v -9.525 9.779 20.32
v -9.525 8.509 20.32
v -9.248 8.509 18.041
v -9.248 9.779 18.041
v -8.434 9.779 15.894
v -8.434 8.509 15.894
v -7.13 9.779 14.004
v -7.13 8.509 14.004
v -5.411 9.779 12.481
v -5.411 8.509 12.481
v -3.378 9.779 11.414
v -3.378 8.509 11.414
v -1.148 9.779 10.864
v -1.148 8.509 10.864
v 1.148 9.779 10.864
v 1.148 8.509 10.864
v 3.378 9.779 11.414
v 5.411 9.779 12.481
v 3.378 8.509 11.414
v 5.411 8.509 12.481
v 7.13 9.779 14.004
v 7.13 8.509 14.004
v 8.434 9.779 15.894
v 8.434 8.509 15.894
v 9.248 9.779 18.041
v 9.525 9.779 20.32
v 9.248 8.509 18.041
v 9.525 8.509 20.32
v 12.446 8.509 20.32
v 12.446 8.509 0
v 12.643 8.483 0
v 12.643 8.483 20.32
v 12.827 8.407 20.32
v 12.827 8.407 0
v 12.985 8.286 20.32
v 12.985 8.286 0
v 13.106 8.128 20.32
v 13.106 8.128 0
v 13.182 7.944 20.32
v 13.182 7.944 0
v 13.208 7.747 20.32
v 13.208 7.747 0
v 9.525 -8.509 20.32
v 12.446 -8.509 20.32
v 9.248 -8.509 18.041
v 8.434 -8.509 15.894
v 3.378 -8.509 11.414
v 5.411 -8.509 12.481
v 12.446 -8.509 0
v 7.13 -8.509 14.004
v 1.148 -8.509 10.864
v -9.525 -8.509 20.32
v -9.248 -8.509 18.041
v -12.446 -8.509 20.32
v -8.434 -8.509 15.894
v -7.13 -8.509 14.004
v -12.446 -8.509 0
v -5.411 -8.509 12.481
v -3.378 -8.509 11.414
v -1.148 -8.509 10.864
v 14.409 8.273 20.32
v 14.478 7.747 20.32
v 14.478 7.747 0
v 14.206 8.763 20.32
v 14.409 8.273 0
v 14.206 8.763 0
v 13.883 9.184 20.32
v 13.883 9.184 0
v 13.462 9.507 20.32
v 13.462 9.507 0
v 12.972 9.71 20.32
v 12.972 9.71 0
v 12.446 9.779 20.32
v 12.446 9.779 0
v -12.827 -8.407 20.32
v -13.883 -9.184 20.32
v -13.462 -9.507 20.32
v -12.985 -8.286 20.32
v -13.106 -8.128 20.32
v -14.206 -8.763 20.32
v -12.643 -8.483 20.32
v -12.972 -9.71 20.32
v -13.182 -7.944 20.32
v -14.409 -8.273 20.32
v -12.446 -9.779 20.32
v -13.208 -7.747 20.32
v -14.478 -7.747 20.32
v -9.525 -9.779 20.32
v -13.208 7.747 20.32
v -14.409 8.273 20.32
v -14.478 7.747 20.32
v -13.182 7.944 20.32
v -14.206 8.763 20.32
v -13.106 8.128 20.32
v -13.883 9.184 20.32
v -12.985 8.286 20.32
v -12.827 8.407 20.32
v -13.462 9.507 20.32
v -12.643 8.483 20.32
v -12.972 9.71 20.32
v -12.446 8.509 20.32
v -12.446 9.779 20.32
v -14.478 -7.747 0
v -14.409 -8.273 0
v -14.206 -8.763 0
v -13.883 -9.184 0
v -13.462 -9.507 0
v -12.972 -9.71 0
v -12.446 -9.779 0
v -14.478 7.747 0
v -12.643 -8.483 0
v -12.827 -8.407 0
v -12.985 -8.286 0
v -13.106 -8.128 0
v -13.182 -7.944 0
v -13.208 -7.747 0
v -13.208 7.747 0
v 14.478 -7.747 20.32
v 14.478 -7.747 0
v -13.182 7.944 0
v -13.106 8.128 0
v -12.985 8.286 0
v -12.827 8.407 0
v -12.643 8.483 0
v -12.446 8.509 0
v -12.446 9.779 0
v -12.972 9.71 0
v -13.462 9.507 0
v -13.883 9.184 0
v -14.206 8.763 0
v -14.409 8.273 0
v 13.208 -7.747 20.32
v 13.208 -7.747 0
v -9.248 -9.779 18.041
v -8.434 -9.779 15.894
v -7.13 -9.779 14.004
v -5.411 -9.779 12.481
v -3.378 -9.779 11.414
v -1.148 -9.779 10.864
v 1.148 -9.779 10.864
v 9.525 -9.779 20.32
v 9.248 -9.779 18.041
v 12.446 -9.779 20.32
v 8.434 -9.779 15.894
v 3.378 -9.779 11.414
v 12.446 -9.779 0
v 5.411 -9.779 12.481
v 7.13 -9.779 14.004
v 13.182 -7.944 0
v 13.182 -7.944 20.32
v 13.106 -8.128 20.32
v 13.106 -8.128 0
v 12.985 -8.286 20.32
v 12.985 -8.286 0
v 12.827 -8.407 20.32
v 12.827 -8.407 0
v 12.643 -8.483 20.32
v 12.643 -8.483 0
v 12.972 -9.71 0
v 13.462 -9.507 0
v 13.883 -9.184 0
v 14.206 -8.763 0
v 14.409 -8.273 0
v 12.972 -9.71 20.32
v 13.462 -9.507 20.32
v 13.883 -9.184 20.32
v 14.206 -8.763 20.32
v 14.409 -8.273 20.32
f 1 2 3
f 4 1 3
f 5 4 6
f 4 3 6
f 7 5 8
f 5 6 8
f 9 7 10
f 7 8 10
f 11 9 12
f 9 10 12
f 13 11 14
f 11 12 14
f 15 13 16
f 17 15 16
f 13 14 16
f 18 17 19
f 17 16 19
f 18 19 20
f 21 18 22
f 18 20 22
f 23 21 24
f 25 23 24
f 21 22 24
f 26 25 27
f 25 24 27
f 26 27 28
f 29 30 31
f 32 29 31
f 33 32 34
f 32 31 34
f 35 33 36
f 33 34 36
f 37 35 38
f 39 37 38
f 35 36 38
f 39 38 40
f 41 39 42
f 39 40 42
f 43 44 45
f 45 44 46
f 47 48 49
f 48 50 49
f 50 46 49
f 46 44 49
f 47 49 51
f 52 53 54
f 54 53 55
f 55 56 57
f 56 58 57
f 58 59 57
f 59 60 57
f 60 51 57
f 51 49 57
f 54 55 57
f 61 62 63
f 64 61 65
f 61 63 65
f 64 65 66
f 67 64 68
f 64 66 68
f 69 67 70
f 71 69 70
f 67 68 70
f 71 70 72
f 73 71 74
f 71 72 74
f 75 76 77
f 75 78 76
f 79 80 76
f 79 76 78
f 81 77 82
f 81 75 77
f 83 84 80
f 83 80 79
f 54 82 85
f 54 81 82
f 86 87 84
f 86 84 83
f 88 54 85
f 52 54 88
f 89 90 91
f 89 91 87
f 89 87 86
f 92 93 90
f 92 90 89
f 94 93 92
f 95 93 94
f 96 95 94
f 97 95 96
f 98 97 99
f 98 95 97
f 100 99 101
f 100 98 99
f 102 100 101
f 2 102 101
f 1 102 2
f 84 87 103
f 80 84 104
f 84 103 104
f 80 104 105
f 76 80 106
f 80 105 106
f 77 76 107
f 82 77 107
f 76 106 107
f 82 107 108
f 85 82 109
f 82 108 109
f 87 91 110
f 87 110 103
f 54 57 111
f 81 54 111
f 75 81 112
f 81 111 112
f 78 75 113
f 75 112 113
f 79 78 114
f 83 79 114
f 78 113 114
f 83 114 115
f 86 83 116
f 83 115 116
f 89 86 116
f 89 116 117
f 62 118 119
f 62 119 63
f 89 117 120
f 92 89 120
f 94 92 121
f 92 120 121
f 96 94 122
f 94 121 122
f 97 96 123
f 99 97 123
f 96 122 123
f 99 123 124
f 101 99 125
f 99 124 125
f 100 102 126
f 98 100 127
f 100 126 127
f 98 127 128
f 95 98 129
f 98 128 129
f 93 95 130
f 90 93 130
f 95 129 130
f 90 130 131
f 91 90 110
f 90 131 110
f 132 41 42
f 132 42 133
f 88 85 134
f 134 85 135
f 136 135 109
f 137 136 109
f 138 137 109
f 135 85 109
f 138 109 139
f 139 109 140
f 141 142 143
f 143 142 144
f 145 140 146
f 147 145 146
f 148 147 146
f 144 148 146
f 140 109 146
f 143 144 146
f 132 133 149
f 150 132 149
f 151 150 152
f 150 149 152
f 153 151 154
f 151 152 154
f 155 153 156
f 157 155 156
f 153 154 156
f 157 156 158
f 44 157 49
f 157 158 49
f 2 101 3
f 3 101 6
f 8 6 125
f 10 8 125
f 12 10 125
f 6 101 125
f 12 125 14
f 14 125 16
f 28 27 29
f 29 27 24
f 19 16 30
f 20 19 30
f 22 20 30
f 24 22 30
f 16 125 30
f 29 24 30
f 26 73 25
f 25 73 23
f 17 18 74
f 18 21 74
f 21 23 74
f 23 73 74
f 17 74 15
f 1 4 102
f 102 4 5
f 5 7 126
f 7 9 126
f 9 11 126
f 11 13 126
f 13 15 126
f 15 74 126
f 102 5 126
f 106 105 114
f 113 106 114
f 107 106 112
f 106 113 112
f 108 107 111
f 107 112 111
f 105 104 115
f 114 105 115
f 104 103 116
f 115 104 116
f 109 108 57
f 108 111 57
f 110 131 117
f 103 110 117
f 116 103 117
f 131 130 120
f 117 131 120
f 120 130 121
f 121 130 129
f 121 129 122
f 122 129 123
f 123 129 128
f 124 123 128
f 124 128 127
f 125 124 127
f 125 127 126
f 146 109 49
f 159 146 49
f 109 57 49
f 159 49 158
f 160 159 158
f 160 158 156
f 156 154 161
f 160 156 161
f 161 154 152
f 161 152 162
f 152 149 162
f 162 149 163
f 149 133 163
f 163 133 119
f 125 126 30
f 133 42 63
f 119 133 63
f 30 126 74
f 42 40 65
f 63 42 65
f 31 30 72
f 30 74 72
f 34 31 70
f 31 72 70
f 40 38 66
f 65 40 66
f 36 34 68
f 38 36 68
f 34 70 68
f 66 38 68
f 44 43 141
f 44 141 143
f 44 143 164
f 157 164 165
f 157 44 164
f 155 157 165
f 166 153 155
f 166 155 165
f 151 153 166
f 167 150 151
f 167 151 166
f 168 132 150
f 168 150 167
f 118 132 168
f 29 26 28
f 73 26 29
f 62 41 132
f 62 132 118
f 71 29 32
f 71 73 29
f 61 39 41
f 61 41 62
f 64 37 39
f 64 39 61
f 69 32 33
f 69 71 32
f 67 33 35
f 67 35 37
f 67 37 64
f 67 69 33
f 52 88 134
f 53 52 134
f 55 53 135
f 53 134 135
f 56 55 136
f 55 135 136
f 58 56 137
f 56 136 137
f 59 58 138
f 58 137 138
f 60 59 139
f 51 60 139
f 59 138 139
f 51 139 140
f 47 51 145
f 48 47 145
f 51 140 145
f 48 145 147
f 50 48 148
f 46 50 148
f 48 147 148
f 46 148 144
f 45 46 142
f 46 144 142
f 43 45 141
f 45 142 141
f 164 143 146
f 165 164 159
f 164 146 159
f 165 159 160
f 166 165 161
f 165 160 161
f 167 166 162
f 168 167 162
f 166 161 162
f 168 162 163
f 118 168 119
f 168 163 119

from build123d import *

# Parameters (mm, degrees)
F1_DEPTH = 20.32
F2_R     = 9.525
F3_DEPTH = 19.559


with BuildPart() as f1:
    # F0 (on Top) → F1 (new body)
    with BuildSketch(Plane.XY):
        with BuildLine():
            ThreePointArc((14.478, 7.747), (13.882841, 9.183841), (12.446, 9.779))
            Line((12.446, 9.779), (-12.446, 9.779))
            ThreePointArc((-12.446, 9.779), (-13.882841, 9.183841), (-14.478, 7.747))
            Line((-14.478, 7.747), (-14.478, -7.747))
            ThreePointArc((-14.478, -7.747), (-13.882841, -9.183841), (-12.446, -9.779))
            Line((-12.446, -9.779), (12.446, -9.779))
            ThreePointArc((12.446, -9.779), (13.882841, -9.183841), (14.478, -7.747))
            Line((14.478, -7.747), (14.478, 7.747))
        make_face()
        with BuildLine():
            Line((-12.446, 8.509), (12.446, 8.509))
            ThreePointArc((12.446, 8.509), (12.984815, 8.285815), (13.208, 7.747))
            Line((13.208, 7.747), (13.208, -7.747))
            ThreePointArc((13.208, -7.747), (12.984815, -8.285815), (12.446, -8.509))
            Line((12.446, -8.509), (-12.446, -8.509))
            ThreePointArc((-12.446, -8.509), (-12.984815, -8.285815), (-13.208, -7.747))
            Line((-13.208, -7.747), (-13.208, 7.747))
            ThreePointArc((-13.208, 7.747), (-12.984815, 8.285815), (-12.446, 8.509))
        make_face(mode=Mode.SUBTRACT)
    extrude(amount=F1_DEPTH)

    # F2 (on face) → F3 (cut, through all)
    with BuildSketch(Plane.XZ.offset(9.779)):
        with Locations((0, 20.32)):
            Circle(F2_R)
    extrude(amount=-F3_DEPTH, mode=Mode.SUBTRACT)


solid = f1.part
